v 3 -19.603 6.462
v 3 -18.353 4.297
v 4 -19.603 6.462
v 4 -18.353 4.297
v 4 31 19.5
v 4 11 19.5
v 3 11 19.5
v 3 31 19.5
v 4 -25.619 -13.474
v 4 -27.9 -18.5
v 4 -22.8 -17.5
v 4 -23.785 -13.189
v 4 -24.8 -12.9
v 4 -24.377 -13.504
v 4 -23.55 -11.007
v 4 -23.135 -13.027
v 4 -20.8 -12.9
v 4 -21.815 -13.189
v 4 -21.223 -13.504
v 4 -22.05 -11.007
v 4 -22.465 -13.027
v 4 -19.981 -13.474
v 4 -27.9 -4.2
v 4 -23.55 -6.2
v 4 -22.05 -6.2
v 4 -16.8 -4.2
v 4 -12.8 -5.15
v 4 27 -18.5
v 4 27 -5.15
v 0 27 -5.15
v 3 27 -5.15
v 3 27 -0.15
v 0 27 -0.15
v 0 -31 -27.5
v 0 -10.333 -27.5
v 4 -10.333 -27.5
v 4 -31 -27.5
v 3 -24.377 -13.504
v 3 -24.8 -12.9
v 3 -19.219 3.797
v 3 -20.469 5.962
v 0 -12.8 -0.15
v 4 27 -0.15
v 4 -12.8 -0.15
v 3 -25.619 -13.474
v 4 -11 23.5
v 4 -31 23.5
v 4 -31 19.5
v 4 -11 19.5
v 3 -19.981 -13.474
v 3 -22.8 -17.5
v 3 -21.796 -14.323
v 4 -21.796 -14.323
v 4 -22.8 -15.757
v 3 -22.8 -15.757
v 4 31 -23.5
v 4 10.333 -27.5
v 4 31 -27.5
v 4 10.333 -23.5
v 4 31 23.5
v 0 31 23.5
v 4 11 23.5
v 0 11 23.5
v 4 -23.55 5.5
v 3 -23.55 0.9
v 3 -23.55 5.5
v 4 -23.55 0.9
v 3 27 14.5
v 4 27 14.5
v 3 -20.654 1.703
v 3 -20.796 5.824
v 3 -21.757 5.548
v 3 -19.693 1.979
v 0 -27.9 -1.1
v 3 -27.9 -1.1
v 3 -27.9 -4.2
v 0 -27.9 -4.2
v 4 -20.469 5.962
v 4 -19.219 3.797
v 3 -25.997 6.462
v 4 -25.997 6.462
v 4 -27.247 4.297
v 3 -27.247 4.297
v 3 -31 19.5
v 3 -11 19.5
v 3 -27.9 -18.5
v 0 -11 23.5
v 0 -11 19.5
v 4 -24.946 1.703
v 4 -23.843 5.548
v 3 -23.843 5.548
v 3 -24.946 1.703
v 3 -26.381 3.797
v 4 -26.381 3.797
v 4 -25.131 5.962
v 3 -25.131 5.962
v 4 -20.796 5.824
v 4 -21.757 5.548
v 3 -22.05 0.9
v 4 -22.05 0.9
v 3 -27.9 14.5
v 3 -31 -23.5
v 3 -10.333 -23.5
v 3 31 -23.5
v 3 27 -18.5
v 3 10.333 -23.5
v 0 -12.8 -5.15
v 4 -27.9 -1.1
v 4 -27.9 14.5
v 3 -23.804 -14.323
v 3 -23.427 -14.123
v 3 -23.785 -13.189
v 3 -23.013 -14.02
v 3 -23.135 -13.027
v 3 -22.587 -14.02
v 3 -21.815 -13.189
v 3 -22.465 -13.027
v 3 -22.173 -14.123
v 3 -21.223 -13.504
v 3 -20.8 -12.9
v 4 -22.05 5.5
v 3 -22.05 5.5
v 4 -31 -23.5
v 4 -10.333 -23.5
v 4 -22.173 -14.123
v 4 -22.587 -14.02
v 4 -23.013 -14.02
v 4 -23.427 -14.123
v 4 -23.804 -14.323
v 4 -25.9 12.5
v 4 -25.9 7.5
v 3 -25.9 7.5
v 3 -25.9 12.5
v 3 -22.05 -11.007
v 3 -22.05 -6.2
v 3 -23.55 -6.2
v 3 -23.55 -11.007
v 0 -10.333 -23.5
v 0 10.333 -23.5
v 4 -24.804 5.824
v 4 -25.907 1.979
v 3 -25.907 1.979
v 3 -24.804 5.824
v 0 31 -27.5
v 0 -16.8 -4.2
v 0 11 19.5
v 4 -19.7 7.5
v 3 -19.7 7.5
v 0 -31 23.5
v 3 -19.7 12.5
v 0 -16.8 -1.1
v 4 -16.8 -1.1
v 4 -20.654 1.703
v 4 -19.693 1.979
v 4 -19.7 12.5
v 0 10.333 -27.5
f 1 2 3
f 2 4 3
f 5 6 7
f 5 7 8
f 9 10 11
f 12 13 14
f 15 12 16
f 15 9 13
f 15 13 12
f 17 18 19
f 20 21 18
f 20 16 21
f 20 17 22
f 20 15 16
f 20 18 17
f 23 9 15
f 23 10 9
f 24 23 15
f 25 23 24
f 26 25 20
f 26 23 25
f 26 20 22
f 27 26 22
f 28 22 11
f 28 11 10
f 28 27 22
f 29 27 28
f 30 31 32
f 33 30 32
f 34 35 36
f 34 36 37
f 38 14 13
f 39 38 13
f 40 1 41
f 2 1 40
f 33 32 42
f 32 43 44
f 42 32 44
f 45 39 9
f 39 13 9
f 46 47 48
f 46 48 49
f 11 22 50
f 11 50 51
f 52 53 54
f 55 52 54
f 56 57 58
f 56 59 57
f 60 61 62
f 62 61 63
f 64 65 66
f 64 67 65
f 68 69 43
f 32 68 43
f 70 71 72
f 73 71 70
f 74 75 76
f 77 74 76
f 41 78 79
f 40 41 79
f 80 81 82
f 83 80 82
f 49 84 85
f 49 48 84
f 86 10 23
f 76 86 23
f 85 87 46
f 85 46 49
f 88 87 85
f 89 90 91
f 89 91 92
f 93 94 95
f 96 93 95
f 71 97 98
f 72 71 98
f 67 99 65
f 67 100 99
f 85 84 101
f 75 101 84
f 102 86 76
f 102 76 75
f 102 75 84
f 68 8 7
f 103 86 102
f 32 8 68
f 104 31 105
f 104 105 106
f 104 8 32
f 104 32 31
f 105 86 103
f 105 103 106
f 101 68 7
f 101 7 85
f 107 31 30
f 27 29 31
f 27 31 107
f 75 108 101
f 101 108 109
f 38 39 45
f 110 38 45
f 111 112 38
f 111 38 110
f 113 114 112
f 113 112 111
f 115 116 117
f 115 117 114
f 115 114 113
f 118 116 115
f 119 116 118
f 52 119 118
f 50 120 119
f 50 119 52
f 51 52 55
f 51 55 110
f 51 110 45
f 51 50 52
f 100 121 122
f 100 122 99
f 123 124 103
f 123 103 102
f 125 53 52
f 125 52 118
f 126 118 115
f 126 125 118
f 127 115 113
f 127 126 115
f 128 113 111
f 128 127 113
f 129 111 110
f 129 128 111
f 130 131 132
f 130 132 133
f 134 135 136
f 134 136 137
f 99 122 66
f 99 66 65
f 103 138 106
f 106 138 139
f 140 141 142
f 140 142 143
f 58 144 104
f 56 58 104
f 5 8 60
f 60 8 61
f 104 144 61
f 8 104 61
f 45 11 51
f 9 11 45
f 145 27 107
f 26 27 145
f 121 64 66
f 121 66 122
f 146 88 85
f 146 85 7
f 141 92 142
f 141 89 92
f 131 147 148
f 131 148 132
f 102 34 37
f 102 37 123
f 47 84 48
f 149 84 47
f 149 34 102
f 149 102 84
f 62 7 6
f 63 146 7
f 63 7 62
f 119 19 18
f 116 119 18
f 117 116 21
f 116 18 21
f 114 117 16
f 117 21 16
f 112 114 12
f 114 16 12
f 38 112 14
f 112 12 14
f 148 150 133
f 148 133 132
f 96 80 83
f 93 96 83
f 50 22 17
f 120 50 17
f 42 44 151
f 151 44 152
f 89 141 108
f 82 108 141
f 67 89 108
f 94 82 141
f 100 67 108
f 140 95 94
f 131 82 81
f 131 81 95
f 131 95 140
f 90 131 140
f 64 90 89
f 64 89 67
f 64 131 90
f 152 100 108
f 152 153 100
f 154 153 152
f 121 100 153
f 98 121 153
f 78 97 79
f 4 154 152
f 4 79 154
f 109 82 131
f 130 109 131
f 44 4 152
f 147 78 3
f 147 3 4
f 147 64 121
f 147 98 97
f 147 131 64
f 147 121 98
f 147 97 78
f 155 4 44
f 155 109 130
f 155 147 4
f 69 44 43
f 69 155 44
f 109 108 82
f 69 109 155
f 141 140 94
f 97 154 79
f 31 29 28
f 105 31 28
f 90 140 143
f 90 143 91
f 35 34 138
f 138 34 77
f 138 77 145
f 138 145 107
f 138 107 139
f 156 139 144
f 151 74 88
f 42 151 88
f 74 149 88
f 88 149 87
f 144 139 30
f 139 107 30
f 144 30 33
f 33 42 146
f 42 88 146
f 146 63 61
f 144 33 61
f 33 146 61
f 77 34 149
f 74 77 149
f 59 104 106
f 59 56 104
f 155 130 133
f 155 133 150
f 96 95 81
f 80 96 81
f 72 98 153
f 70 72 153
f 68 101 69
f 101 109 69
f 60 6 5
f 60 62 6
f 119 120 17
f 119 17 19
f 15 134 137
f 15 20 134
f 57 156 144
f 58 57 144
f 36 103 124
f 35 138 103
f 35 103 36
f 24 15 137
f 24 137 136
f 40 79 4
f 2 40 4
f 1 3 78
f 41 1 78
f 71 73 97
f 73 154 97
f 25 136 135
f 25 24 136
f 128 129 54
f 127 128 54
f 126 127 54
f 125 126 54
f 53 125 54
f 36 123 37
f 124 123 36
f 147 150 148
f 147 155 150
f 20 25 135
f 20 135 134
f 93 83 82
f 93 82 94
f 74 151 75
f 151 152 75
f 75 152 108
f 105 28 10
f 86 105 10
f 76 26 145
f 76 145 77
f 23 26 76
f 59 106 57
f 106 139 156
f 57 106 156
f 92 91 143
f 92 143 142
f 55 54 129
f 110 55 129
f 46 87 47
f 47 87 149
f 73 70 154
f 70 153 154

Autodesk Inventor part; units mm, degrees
ref_plane "YZ Plane" through (0, 0, 0) normal (1, 0, 0) x (0, 1, 0)
ref_plane "XZ Plane" through (0, 0, 0) normal (0, 1, 0) x (-1, 0, 0)
ref_plane "XY Plane" through (0, 0, 0) normal (0, 0, 1) x (1, 0, 0)
sketch "Sketch1" plane through (0, 0, 0) normal (1, 0, 0) x (0, 1, 0)
  line L0 (-31, -23.5) -> (-10.3333, -23.5) construction
  line L1 (31, -23.5) -> (31, 23.5)
  line L2 (31, 23.5) -> (11, 23.5)
  line L3 (-31, 23.5) -> (-31, -23.5)
  line L4 (-31, -23.5) -> (31, 23.5) construction
  line L5 (31, -23.5) -> (-31, 23.5) construction
  line L6 (-11, 23.5) -> (-11, 19.5)
  line L7 (-11, 19.5) -> (11, 19.5)
  line L8 (11, 19.5) -> (11, 23.5)
  line L9 (11, 23.5) -> (-11, 23.5) construction
  line L10 (-11, 23.5) -> (-31, 23.5)
  line L11 (31, -23.5) -> (10.3333, -23.5) construction
  line L12 (10.3333, -23.5) -> (10.3333, -27.5)
  line L13 (10.3333, -27.5) -> (31, -27.5)
  line L14 (31, -27.5) -> (31, -23.5)
  line L15 (-31, -23.5) -> (-10.3333, -23.5) construction
  line L16 (-10.3333, -23.5) -> (-10.3333, -27.5)
  line L17 (-10.3333, -27.5) -> (-31, -27.5)
  line L18 (-31, -27.5) -> (-31, -23.5)
  line L19 (10.3333, -23.5) -> (31, -23.5) construction
  line L20 (-10.3333, -23.5) -> (10.3333, -23.5)
  point P0 (0, 0)
  point P1 (11, 21.5)
  dimension "d0" = 62
  dimension "d1" = 47
  dimension "d2" = 20
  dimension "d3" = 4
  dimension "d5" = 4
extrude "Outline" add sketch "Sketch1" along normal blind 4
sketch "Sketch2" plane through (4, 0, 0) normal (1, 0, 0) x (0, 0, -1)
  line L0 (1.1, 27) -> (1.1, -27.9)
  line L1 (1.1, -27.9) -> (4.2, -27.9)
  line L2 (4.2, -27.9) -> (4.2, 27)
  line L3 (4.2, 27) -> (1.1, 27)
  line L4 (-14.5, -0.45) -> (-6.7, -0.45) construction
  line L5 (-6.7, -0.45) -> (1.1, -0.45) construction
  line L6 (18.5, -0.45) -> (4.2, -0.45) construction
  line L7 (-19.5, 31) -> (23.5, 31)
  line L8 (23.5, 31) -> (23.5, -31)
  line L9 (-19.5, -31) -> (-19.5, 31)
  line L10 (-14.5, 27) -> (18.5, 27)
  line L11 (18.5, 27) -> (18.5, -27.9)
  line L12 (18.5, -27.9) -> (-14.5, -27.9)
  line L13 (-14.5, -27.9) -> (-14.5, 27)
  line L14 (-12.5, -19.7) -> (-7.5, -19.7)
  line L15 (-7.5, -19.7) -> (-7.5, -25.9)
  line L16 (-7.5, -25.9) -> (-12.5, -25.9)
  line L17 (-12.5, -25.9) -> (-12.5, -19.7)
  line L18 (-5.5, -22.05) -> (-0.9, -22.05)
  line L19 (-0.9, -22.05) -> (-0.9, -23.55)
  line L20 (-0.9, -23.55) -> (-5.5, -23.55)
  line L21 (-5.5, -23.55) -> (-5.5, -22.05)
  line L22 (13.4738, -19.9808) -> (17.5, -22.8)
  line L23 (17.5, -22.8) -> (13.4738, -25.6192)
  line L24 (13.4738, -19.9808) -> (12.9003, -20.8)
  line L25 (12.9003, -20.8) -> (15.7566, -22.8)
  line L26 (15.7566, -22.8) -> (12.9003, -24.8)
  line L27 (12.9003, -24.8) -> (13.4738, -25.6192)
  line L28 (-12.5, -22.8) -> (15.7566, -22.8) construction
  arc A0 (13.5039, -21.2227) -> (13.5039, -24.3773) centre (15.7566, -22.8) ccw
  arc A1 (14.323, -21.7962) -> (14.323, -23.8038) centre (15.7566, -22.8) ccw
  line L29 (6.2, -22.05) -> (11.0066, -22.05)
  line L30 (11.0066, -22.05) -> (11.0066, -23.55)
  line L31 (11.0066, -23.55) -> (6.2, -23.55)
  line L32 (6.2, -23.55) -> (6.2, -22.05)
  line L33 (-5.8236, -20.7956) -> (-5.548, -21.7568)
  line L34 (-5.548, -21.7568) -> (-1.703, -20.6543)
  line L35 (-1.703, -20.6543) -> (-1.9786, -19.693)
  line L36 (-1.9786, -19.693) -> (-5.8236, -20.7956)
  line L37 (-5.548, -23.8432) -> (-1.703, -24.9457)
  line L38 (-1.703, -24.9457) -> (-1.9786, -25.907)
  line L39 (-1.9786, -25.907) -> (-5.8236, -24.8044)
  line L40 (-5.8236, -24.8044) -> (-5.548, -23.8432)
  circle A2 centre (-11, -22.8) radius 5.5509 construction
  line L41 (-6.4623, -19.6028) -> (-5.9623, -20.4688)
  line L42 (-5.9623, -20.4688) -> (-3.7973, -19.2188)
  line L43 (-3.7973, -19.2188) -> (-4.2973, -18.3528)
  line L44 (-4.2973, -18.3528) -> (-6.4623, -19.6028)
  line L45 (-5.9623, -25.1312) -> (-6.4623, -25.9972)
  line L46 (-6.4623, -25.9972) -> (-4.2973, -27.2472)
  line L47 (-4.2973, -27.2472) -> (-3.7973, -26.3812)
  line L48 (-3.7973, -26.3812) -> (-5.9623, -25.1312)
  line L49 (23.5, 10.3333) -> (27.5, 10.3333) projected
  line L50 (27.5, 10.3333) -> (27.5, 31) projected
  line L51 (27.5, 31) -> (-23.5, 31) projected
  line L52 (-23.5, 31) -> (-23.5, 11) projected
  line L53 (-23.5, 11) -> (-19.5, 11) projected
  line L54 (-19.5, 11) -> (-19.5, -11) projected
  line L55 (-19.5, -11) -> (-23.5, -11) projected
  line L56 (-23.5, -11) -> (-23.5, -31) projected
  line L57 (-23.5, -31) -> (27.5, -31) projected
  line L58 (27.5, -31) -> (27.5, -10.3333) projected
  line L59 (27.5, -10.3333) -> (23.5, -10.3333) projected
  line L60 (23.5, -10.3333) -> (23.5, 10.3333) projected
  point P0 (0, 0)
  point P1 (-7.5, -22.8)
  point P2 (-5.5, -22.8)
  point P3 (13.0066, -22.8)
  point P4 (4.2, -27.9)
  dimension "d14" = 3.1
  dimension "d17" = 5
  dimension "d19" = 5
  dimension "d22" = 35
  dimension "d23" = 35
  dimension "d24" = 4
  dimension "d25" = 1
  dimension "d26" = 1
  dimension "d27" = 2.75
  dimension "d29" = 1
  dimension "d30" = 1.5
  dimension "d31" = 2
  dimension "d32" = 2
  dimension "d33" = 2
  dimension "d34" = 2
  dimension "d35" = 2
  dimension "d36" = 5
  dimension "d37" = 2
  dimension "d38" = 1
  dimension "d39" = 1
  dimension "d42" = 3.5
  dimension "d43" = 16
  dimension "d44" = 16
  dimension "d45" = 4
  dimension "d47" = 2.5
  dimension "d48" = 1
  dimension "d49" = 14
  dimension "d50" = 14
  dimension "d51" = 1
  dimension "d52" = 2.5
  dimension "d62" = 14.3
  dimension "d65" = 6.2
  dimension "d66" = 4
  dimension "d67" = 3.1
extrude "Engravings" cut sketch "Sketch2" against normal blind 1 contours L3 L2 L1 L0 | L7 L8 L57 L9 | L14 L15 L16 L17 | L18 L19 L20 L21 | L22 L23 L27 L26 L25 L24 | L25 A1 L26 A0 | L29 L30 L31 L32 | L36 L35 L34 L33 | L37 L38 L39 L40 | L44 L43 L42 L41 | L48 L47 L46 L45
sketch "Sketch3" plane through (4, 0, 0) normal (1, 0, 0) x (0, 0, -1)
  line L0 (-7.5, -19.7) -> (-7.5, -25.9) projected
  line L1 (-7.5, -25.9) -> (-12.5, -25.9) projected
  line L2 (-12.5, -25.9) -> (-12.5, -19.7) projected
  line L3 (-12.5, -19.7) -> (-7.5, -19.7) projected
  line L4 (-3.7973, -26.3812) -> (-4.2973, -27.2472) projected
  line L5 (-4.2973, -27.2472) -> (-6.4623, -25.9972) projected
  line L6 (-6.4623, -25.9972) -> (-5.9623, -25.1312) projected
  line L7 (-5.9623, -25.1312) -> (-3.7973, -26.3812) projected
  line L8 (-0.9, -22.05) -> (-0.9, -23.55)
  line L9 (-0.9, -23.55) -> (-5.5, -23.55) projected
  line L10 (-5.5, -23.55) -> (-5.5, -22.05) projected
  line L11 (-5.5, -22.05) -> (-0.9, -22.05) projected
  line L12 (-4.2973, -18.3528) -> (-3.7973, -19.2188) projected
  line L13 (-3.7973, -19.2188) -> (-5.9623, -20.4688) projected
  line L14 (-5.9623, -20.4688) -> (-6.4623, -19.6028) projected
  line L15 (-6.4623, -19.6028) -> (-4.2973, -18.3528) projected
  line L16 (-1.9786, -19.693) -> (-1.703, -20.6543) projected
  line L17 (-1.703, -20.6543) -> (-5.548, -21.7568) projected
  line L18 (-5.548, -21.7568) -> (-5.8236, -20.7956) projected
  line L19 (-5.8236, -20.7956) -> (-1.9786, -19.693) projected
  line L20 (-1.703, -24.9457) -> (-1.9786, -25.907) projected
  line L21 (-1.9786, -25.907) -> (-5.8236, -24.8044) projected
  line L22 (-5.8236, -24.8044) -> (-5.548, -23.8432) projected
  line L23 (-5.548, -23.8432) -> (-1.703, -24.9457) projected
  line L24 (23.5, -31) -> (-19.5, -31) projected
  line L25 (23.5, 31) -> (23.5, 10.3333) projected
  line L26 (-19.5, 31) -> (23.5, 31) projected
  line L27 (-19.5, -11) -> (-19.5, 11) projected
  line L28 (18.5, -27.9) -> (18.5, 27) projected
  line L29 (-14.5, 27) -> (-14.5, -27.9) projected
  line L30 (1.1, -27.9) -> (4.2, -27.9)
  line L31 (0.15, 27) -> (0.15, -12.8)
  line L32 (0.15, -12.8) -> (1.1, -16.8)
  line L33 (5.15, 27) -> (5.15, -12.8)
  line L34 (5.15, -12.8) -> (4.2, -16.8)
  line L35 (4.2, -16.8) -> (4.2, -27.9)
  line L36 (-19.5, -31) -> (-19.5, -11) projected
  line L37 (23.5, 10.3333) -> (23.5, -10.3333) projected
  line L38 (-19.5, 11) -> (-19.5, 31) projected
  line L39 (23.5, -10.3333) -> (27.5, -10.3333) projected
  line L40 (27.5, -10.3333) -> (27.5, -31) projected
  line L41 (-14.5, -27.9) -> (18.5, -27.9) projected
  line L42 (1.1, -27.9) -> (1.1, 27) construction
  line L43 (4.2, 27) -> (4.2, -27.9) construction
  line L44 (18.5, 27) -> (4.2, 27) projected
  line L45 (1.1, 27) -> (-14.5, 27) projected
  line L46 (1.1, 27) -> (4.2, 27)
  line L47 (1.1, -27.9) -> (1.1, 27) construction
  line L48 (1.1, -16.8) -> (1.1, -27.9)
  point P0 (0, 0)
  dimension "d68" = 5
  dimension "d69" = 11.1
  dimension "d70" = 4
extrude "Groove" cut sketch "Sketch3" against normal up to next contours L30 L48 L32 L31 L45 L46 L44 L33 L34 L35
sketch "Sketch4" plane through (3, 0, 0) normal (1, 0, 0) x (0, 0, -1)
  line L0 (-7.5, -25.9) -> (-7.5, -19.7) projected
  line L1 (-7.5, -19.7) -> (-12.5, -19.7) projected
  line L2 (-12.5, -19.7) -> (-12.5, -25.9) projected
  line L3 (-12.5, -25.9) -> (-7.5, -25.9) projected
  line L4 (-4.2973, -27.2472) -> (-3.7973, -26.3812) projected
  line L5 (-3.7973, -26.3812) -> (-5.9623, -25.1312) projected
  line L6 (-5.9623, -25.1312) -> (-6.4623, -25.9972) projected
  line L7 (-6.4623, -25.9972) -> (-4.2973, -27.2472) projected
  line L8 (14.323, -21.7962) -> (15.7566, -22.8) projected
  line L9 (15.7566, -22.8) -> (14.323, -23.8038) projected
  arc A0 (14.323, -21.7962) -> (14.323, -23.8038) centre (15.7566, -22.8) ccw projected
  line L10 (13.4738, -25.6192) -> (17.5, -22.8) projected
  line L11 (17.5, -22.8) -> (13.4738, -19.9808) projected
  line L12 (13.4738, -19.9808) -> (12.9003, -20.8) projected
  line L13 (12.9003, -20.8) -> (13.5039, -21.2227) projected
  arc A1 (13.5039, -21.2227) -> (13.5039, -24.3773) centre (15.7566, -22.8) ccw projected
  line L14 (13.5039, -24.3773) -> (12.9003, -24.8) projected
  line L15 (12.9003, -24.8) -> (13.4738, -25.6192) projected
  line L16 (-0.9, -23.55) -> (-0.9, -22.05) projected
  line L17 (-0.9, -22.05) -> (-5.5, -22.05) projected
  line L18 (-5.5, -22.05) -> (-5.5, -23.55) projected
  line L19 (-5.5, -23.55) -> (-0.9, -23.55) projected
  line L20 (27.5, 10.3333) -> (23.5, 10.3333) projected
  line L21 (27.5, 31) -> (27.5, 10.3333) projected
  line L22 (-23.5, 31) -> (-19.5, 31) projected
  line L23 (-19.5, -31) -> (-23.5, -31) projected
  line L24 (-23.5, 11) -> (-23.5, 31) projected
  line L25 (-19.5, 11) -> (-23.5, 11) projected
  line L26 (-23.5, -31) -> (-23.5, -11) projected
  line L27 (-23.5, -11) -> (-19.5, -11) projected
  line L28 (-3.7973, -19.2188) -> (-4.2973, -18.3528) projected
  line L29 (-4.2973, -18.3528) -> (-6.4623, -19.6028) projected
  line L30 (-6.4623, -19.6028) -> (-5.9623, -20.4688) projected
  line L31 (-5.9623, -20.4688) -> (-3.7973, -19.2188) projected
  line L32 (11.0066, -23.55) -> (11.0066, -22.05) projected
  line L33 (11.0066, -22.05) -> (6.2, -22.05) projected
  line L34 (6.2, -22.05) -> (6.2, -23.55) projected
  line L35 (6.2, -23.55) -> (11.0066, -23.55) projected
  line L36 (-1.703, -20.6543) -> (-1.9786, -19.693) projected
  line L37 (-1.9786, -19.693) -> (-5.8236, -20.7956) projected
  line L38 (-5.8236, -20.7956) -> (-5.548, -21.7568) projected
  line L39 (-5.548, -21.7568) -> (-1.703, -20.6543) projected
  line L40 (-1.9786, -25.907) -> (-1.703, -24.9457) projected
  line L41 (-1.703, -24.9457) -> (-5.548, -23.8432) projected
  line L42 (-5.548, -23.8432) -> (-5.8236, -24.8044) projected
  line L43 (-5.8236, -24.8044) -> (-1.9786, -25.907) projected
  line L44 (18.5, 27) -> (18.5, -27.9) projected
  line L45 (-14.5, -27.9) -> (-14.5, 27) projected
  line L46 (1.1, -27.9) -> (-14.5, -27.9) projected
  line L47 (23.5, -31) -> (-19.5, -31) projected
  line L48 (-19.5, -11) -> (-19.5, -31) projected
  line L49 (-19.5, -11) -> (-19.5, 11) projected
  line L50 (-19.5, 31) -> (-19.5, 11) projected
  line L51 (-19.5, 31) -> (23.5, 31) projected
  line L52 (23.5, 10.3333) -> (23.5, 31) projected
  line L53 (23.5, 10.3333) -> (23.5, -10.3333) projected
  line L54 (23.5, 31) -> (27.5, 31) projected
  line L55 (-14.5, 27) -> (0.15, 27) projected
  line L56 (5.15, 27) -> (18.5, 27) projected
  line L57 (18.5, -27.9) -> (4.2, -27.9) projected
  line L58 (5.15, 27) -> (0.15, 27) projected
  line L59 (5.15, -12.8) -> (5.15, 27) projected
  line L60 (4.2, -16.8) -> (5.15, -12.8) projected
  line L61 (4.2, -27.9) -> (4.2, -16.8) projected
  line L62 (1.1, -16.8) -> (1.1, -27.9) projected
  line L63 (0.15, -12.8) -> (1.1, -16.8) projected
  line L64 (0.15, 27) -> (0.15, -12.8) projected
  line L65 (1.1, -27.9) -> (4.2, -27.9) projected
  line L66 (23.5, -31) -> (23.5, -10.3333) projected
  line L67 (27.5, -31) -> (23.5, -31) projected
  line L68 (27.5, -10.3333) -> (27.5, -31) projected
  line L69 (23.5, -10.3333) -> (27.5, -10.3333) projected
  point P0 (0, 0)
sketch "Sketch5" plane through (3, 0, 0) normal (1, 0, 0) x (0, 0, -1)
  line L0 (-1.9786, -25.907) -> (-1.703, -24.9457) projected
  line L1 (-1.703, -24.9457) -> (-5.548, -23.8432) projected
  line L2 (-5.548, -23.8432) -> (-5.8236, -24.8044) projected
  line L3 (-5.8236, -24.8044) -> (-1.9786, -25.907) projected
  line L4 (-7.5, -25.9) -> (-7.5, -19.7) projected
  line L5 (-7.5, -19.7) -> (-12.5, -19.7) projected
  line L6 (-12.5, -19.7) -> (-12.5, -25.9) projected
  line L7 (-12.5, -25.9) -> (-7.5, -25.9) projected
  line L8 (-0.9, -23.55) -> (-0.9, -22.05) projected
  line L9 (-0.9, -22.05) -> (-5.5, -22.05) projected
  line L10 (-5.5, -22.05) -> (-5.5, -23.55) projected
  line L11 (-5.5, -23.55) -> (-0.9, -23.55) projected
  line L12 (-4.2973, -27.2472) -> (-3.7973, -26.3812) projected
  line L13 (-3.7973, -26.3812) -> (-5.9623, -25.1312) projected
  line L14 (-5.9623, -25.1312) -> (-6.4623, -25.9972) projected
  line L15 (-6.4623, -25.9972) -> (-4.2973, -27.2472) projected
  line L16 (-14.5, -27.9) -> (-14.5, 27) projected
  line L17 (-14.5, 27) -> (0.15, 27) projected
  line L18 (5.15, 27) -> (0.15, 27) projected
  line L19 (5.15, -12.8) -> (5.15, 27) projected
  line L20 (4.2, -16.8) -> (5.15, -12.8) projected
  line L21 (4.2, -27.9) -> (4.2, -16.8) projected
  line L22 (1.1, -27.9) -> (4.2, -27.9) projected
  line L23 (1.1, -16.8) -> (1.1, -27.9) projected
  line L24 (0.15, -12.8) -> (1.1, -16.8) projected
  line L25 (0.15, 27) -> (0.15, -12.8) projected
  line L26 (1.1, -27.9) -> (-14.5, -27.9) projected
  line L27 (5.15, 27) -> (18.5, 27) projected
  line L28 (18.5, 27) -> (18.5, -27.9) projected
  line L29 (18.5, -27.9) -> (4.2, -27.9) projected
  line L30 (23.5, -31) -> (23.5, -10.3333) projected
  line L31 (23.5, 10.3333) -> (23.5, -10.3333) projected
  line L32 (23.5, 10.3333) -> (23.5, 31) projected
  line L33 (-19.5, 31) -> (23.5, 31) projected
  line L34 (-19.5, 31) -> (-19.5, 11) projected
  line L35 (-19.5, -11) -> (-19.5, 11) projected
  line L36 (-19.5, -11) -> (-19.5, -31) projected
  line L37 (23.5, -31) -> (-19.5, -31) projected
  line L38 (27.5, -31) -> (23.5, -31) projected
  line L39 (27.5, -10.3333) -> (27.5, -31) projected
  line L40 (23.5, -10.3333) -> (27.5, -10.3333) projected
  line L41 (27.5, 10.3333) -> (23.5, 10.3333) projected
  line L42 (27.5, 31) -> (27.5, 10.3333) projected
  line L43 (23.5, 31) -> (27.5, 31) projected
  line L44 (-23.5, 31) -> (-19.5, 31) projected
  line L45 (-23.5, 11) -> (-23.5, 31) projected
  line L46 (-19.5, 11) -> (-23.5, 11) projected
  line L47 (-23.5, -11) -> (-19.5, -11) projected
  line L48 (-23.5, -31) -> (-23.5, -11) projected
  line L49 (-19.5, -31) -> (-23.5, -31) projected
  line L50 (-1.703, -20.6543) -> (-1.9786, -19.693) projected
  line L51 (-1.9786, -19.693) -> (-5.8236, -20.7956) projected
  line L52 (-5.8236, -20.7956) -> (-5.548, -21.7568) projected
  line L53 (-5.548, -21.7568) -> (-1.703, -20.6543) projected
  line L54 (14.323, -21.7962) -> (15.7566, -22.8) projected
  line L55 (15.7566, -22.8) -> (14.323, -23.8038) projected
  arc A0 (14.323, -21.7962) -> (14.323, -23.8038) centre (15.7566, -22.8) ccw projected
  line L56 (13.4738, -25.6192) -> (17.5, -22.8) projected
  line L57 (17.5, -22.8) -> (13.4738, -19.9808) projected
  line L58 (13.4738, -19.9808) -> (12.9003, -20.8) projected
  line L59 (12.9003, -20.8) -> (13.5039, -21.2227) projected
  arc A1 (13.5039, -21.2227) -> (13.5039, -24.3773) centre (15.7566, -22.8) ccw projected
  line L60 (13.5039, -24.3773) -> (12.9003, -24.8) projected
  line L61 (12.9003, -24.8) -> (13.4738, -25.6192) projected
  line L62 (11.0066, -23.55) -> (11.0066, -22.05) projected
  line L63 (11.0066, -22.05) -> (6.2, -22.05) projected
  line L64 (6.2, -22.05) -> (6.2, -23.55) projected
  line L65 (6.2, -23.55) -> (11.0066, -23.55) projected
  line L66 (-3.7973, -19.2188) -> (-4.2973, -18.3528) projected
  line L67 (-4.2973, -18.3528) -> (-6.4623, -19.6028) projected
  line L68 (-6.4623, -19.6028) -> (-5.9623, -20.4688) projected
  line L69 (-5.9623, -20.4688) -> (-3.7973, -19.2188) projected
  point P0 (0, 0)
properties part number "LightGate_Door_V1" material "MDF Medium Density Fiberboard"
